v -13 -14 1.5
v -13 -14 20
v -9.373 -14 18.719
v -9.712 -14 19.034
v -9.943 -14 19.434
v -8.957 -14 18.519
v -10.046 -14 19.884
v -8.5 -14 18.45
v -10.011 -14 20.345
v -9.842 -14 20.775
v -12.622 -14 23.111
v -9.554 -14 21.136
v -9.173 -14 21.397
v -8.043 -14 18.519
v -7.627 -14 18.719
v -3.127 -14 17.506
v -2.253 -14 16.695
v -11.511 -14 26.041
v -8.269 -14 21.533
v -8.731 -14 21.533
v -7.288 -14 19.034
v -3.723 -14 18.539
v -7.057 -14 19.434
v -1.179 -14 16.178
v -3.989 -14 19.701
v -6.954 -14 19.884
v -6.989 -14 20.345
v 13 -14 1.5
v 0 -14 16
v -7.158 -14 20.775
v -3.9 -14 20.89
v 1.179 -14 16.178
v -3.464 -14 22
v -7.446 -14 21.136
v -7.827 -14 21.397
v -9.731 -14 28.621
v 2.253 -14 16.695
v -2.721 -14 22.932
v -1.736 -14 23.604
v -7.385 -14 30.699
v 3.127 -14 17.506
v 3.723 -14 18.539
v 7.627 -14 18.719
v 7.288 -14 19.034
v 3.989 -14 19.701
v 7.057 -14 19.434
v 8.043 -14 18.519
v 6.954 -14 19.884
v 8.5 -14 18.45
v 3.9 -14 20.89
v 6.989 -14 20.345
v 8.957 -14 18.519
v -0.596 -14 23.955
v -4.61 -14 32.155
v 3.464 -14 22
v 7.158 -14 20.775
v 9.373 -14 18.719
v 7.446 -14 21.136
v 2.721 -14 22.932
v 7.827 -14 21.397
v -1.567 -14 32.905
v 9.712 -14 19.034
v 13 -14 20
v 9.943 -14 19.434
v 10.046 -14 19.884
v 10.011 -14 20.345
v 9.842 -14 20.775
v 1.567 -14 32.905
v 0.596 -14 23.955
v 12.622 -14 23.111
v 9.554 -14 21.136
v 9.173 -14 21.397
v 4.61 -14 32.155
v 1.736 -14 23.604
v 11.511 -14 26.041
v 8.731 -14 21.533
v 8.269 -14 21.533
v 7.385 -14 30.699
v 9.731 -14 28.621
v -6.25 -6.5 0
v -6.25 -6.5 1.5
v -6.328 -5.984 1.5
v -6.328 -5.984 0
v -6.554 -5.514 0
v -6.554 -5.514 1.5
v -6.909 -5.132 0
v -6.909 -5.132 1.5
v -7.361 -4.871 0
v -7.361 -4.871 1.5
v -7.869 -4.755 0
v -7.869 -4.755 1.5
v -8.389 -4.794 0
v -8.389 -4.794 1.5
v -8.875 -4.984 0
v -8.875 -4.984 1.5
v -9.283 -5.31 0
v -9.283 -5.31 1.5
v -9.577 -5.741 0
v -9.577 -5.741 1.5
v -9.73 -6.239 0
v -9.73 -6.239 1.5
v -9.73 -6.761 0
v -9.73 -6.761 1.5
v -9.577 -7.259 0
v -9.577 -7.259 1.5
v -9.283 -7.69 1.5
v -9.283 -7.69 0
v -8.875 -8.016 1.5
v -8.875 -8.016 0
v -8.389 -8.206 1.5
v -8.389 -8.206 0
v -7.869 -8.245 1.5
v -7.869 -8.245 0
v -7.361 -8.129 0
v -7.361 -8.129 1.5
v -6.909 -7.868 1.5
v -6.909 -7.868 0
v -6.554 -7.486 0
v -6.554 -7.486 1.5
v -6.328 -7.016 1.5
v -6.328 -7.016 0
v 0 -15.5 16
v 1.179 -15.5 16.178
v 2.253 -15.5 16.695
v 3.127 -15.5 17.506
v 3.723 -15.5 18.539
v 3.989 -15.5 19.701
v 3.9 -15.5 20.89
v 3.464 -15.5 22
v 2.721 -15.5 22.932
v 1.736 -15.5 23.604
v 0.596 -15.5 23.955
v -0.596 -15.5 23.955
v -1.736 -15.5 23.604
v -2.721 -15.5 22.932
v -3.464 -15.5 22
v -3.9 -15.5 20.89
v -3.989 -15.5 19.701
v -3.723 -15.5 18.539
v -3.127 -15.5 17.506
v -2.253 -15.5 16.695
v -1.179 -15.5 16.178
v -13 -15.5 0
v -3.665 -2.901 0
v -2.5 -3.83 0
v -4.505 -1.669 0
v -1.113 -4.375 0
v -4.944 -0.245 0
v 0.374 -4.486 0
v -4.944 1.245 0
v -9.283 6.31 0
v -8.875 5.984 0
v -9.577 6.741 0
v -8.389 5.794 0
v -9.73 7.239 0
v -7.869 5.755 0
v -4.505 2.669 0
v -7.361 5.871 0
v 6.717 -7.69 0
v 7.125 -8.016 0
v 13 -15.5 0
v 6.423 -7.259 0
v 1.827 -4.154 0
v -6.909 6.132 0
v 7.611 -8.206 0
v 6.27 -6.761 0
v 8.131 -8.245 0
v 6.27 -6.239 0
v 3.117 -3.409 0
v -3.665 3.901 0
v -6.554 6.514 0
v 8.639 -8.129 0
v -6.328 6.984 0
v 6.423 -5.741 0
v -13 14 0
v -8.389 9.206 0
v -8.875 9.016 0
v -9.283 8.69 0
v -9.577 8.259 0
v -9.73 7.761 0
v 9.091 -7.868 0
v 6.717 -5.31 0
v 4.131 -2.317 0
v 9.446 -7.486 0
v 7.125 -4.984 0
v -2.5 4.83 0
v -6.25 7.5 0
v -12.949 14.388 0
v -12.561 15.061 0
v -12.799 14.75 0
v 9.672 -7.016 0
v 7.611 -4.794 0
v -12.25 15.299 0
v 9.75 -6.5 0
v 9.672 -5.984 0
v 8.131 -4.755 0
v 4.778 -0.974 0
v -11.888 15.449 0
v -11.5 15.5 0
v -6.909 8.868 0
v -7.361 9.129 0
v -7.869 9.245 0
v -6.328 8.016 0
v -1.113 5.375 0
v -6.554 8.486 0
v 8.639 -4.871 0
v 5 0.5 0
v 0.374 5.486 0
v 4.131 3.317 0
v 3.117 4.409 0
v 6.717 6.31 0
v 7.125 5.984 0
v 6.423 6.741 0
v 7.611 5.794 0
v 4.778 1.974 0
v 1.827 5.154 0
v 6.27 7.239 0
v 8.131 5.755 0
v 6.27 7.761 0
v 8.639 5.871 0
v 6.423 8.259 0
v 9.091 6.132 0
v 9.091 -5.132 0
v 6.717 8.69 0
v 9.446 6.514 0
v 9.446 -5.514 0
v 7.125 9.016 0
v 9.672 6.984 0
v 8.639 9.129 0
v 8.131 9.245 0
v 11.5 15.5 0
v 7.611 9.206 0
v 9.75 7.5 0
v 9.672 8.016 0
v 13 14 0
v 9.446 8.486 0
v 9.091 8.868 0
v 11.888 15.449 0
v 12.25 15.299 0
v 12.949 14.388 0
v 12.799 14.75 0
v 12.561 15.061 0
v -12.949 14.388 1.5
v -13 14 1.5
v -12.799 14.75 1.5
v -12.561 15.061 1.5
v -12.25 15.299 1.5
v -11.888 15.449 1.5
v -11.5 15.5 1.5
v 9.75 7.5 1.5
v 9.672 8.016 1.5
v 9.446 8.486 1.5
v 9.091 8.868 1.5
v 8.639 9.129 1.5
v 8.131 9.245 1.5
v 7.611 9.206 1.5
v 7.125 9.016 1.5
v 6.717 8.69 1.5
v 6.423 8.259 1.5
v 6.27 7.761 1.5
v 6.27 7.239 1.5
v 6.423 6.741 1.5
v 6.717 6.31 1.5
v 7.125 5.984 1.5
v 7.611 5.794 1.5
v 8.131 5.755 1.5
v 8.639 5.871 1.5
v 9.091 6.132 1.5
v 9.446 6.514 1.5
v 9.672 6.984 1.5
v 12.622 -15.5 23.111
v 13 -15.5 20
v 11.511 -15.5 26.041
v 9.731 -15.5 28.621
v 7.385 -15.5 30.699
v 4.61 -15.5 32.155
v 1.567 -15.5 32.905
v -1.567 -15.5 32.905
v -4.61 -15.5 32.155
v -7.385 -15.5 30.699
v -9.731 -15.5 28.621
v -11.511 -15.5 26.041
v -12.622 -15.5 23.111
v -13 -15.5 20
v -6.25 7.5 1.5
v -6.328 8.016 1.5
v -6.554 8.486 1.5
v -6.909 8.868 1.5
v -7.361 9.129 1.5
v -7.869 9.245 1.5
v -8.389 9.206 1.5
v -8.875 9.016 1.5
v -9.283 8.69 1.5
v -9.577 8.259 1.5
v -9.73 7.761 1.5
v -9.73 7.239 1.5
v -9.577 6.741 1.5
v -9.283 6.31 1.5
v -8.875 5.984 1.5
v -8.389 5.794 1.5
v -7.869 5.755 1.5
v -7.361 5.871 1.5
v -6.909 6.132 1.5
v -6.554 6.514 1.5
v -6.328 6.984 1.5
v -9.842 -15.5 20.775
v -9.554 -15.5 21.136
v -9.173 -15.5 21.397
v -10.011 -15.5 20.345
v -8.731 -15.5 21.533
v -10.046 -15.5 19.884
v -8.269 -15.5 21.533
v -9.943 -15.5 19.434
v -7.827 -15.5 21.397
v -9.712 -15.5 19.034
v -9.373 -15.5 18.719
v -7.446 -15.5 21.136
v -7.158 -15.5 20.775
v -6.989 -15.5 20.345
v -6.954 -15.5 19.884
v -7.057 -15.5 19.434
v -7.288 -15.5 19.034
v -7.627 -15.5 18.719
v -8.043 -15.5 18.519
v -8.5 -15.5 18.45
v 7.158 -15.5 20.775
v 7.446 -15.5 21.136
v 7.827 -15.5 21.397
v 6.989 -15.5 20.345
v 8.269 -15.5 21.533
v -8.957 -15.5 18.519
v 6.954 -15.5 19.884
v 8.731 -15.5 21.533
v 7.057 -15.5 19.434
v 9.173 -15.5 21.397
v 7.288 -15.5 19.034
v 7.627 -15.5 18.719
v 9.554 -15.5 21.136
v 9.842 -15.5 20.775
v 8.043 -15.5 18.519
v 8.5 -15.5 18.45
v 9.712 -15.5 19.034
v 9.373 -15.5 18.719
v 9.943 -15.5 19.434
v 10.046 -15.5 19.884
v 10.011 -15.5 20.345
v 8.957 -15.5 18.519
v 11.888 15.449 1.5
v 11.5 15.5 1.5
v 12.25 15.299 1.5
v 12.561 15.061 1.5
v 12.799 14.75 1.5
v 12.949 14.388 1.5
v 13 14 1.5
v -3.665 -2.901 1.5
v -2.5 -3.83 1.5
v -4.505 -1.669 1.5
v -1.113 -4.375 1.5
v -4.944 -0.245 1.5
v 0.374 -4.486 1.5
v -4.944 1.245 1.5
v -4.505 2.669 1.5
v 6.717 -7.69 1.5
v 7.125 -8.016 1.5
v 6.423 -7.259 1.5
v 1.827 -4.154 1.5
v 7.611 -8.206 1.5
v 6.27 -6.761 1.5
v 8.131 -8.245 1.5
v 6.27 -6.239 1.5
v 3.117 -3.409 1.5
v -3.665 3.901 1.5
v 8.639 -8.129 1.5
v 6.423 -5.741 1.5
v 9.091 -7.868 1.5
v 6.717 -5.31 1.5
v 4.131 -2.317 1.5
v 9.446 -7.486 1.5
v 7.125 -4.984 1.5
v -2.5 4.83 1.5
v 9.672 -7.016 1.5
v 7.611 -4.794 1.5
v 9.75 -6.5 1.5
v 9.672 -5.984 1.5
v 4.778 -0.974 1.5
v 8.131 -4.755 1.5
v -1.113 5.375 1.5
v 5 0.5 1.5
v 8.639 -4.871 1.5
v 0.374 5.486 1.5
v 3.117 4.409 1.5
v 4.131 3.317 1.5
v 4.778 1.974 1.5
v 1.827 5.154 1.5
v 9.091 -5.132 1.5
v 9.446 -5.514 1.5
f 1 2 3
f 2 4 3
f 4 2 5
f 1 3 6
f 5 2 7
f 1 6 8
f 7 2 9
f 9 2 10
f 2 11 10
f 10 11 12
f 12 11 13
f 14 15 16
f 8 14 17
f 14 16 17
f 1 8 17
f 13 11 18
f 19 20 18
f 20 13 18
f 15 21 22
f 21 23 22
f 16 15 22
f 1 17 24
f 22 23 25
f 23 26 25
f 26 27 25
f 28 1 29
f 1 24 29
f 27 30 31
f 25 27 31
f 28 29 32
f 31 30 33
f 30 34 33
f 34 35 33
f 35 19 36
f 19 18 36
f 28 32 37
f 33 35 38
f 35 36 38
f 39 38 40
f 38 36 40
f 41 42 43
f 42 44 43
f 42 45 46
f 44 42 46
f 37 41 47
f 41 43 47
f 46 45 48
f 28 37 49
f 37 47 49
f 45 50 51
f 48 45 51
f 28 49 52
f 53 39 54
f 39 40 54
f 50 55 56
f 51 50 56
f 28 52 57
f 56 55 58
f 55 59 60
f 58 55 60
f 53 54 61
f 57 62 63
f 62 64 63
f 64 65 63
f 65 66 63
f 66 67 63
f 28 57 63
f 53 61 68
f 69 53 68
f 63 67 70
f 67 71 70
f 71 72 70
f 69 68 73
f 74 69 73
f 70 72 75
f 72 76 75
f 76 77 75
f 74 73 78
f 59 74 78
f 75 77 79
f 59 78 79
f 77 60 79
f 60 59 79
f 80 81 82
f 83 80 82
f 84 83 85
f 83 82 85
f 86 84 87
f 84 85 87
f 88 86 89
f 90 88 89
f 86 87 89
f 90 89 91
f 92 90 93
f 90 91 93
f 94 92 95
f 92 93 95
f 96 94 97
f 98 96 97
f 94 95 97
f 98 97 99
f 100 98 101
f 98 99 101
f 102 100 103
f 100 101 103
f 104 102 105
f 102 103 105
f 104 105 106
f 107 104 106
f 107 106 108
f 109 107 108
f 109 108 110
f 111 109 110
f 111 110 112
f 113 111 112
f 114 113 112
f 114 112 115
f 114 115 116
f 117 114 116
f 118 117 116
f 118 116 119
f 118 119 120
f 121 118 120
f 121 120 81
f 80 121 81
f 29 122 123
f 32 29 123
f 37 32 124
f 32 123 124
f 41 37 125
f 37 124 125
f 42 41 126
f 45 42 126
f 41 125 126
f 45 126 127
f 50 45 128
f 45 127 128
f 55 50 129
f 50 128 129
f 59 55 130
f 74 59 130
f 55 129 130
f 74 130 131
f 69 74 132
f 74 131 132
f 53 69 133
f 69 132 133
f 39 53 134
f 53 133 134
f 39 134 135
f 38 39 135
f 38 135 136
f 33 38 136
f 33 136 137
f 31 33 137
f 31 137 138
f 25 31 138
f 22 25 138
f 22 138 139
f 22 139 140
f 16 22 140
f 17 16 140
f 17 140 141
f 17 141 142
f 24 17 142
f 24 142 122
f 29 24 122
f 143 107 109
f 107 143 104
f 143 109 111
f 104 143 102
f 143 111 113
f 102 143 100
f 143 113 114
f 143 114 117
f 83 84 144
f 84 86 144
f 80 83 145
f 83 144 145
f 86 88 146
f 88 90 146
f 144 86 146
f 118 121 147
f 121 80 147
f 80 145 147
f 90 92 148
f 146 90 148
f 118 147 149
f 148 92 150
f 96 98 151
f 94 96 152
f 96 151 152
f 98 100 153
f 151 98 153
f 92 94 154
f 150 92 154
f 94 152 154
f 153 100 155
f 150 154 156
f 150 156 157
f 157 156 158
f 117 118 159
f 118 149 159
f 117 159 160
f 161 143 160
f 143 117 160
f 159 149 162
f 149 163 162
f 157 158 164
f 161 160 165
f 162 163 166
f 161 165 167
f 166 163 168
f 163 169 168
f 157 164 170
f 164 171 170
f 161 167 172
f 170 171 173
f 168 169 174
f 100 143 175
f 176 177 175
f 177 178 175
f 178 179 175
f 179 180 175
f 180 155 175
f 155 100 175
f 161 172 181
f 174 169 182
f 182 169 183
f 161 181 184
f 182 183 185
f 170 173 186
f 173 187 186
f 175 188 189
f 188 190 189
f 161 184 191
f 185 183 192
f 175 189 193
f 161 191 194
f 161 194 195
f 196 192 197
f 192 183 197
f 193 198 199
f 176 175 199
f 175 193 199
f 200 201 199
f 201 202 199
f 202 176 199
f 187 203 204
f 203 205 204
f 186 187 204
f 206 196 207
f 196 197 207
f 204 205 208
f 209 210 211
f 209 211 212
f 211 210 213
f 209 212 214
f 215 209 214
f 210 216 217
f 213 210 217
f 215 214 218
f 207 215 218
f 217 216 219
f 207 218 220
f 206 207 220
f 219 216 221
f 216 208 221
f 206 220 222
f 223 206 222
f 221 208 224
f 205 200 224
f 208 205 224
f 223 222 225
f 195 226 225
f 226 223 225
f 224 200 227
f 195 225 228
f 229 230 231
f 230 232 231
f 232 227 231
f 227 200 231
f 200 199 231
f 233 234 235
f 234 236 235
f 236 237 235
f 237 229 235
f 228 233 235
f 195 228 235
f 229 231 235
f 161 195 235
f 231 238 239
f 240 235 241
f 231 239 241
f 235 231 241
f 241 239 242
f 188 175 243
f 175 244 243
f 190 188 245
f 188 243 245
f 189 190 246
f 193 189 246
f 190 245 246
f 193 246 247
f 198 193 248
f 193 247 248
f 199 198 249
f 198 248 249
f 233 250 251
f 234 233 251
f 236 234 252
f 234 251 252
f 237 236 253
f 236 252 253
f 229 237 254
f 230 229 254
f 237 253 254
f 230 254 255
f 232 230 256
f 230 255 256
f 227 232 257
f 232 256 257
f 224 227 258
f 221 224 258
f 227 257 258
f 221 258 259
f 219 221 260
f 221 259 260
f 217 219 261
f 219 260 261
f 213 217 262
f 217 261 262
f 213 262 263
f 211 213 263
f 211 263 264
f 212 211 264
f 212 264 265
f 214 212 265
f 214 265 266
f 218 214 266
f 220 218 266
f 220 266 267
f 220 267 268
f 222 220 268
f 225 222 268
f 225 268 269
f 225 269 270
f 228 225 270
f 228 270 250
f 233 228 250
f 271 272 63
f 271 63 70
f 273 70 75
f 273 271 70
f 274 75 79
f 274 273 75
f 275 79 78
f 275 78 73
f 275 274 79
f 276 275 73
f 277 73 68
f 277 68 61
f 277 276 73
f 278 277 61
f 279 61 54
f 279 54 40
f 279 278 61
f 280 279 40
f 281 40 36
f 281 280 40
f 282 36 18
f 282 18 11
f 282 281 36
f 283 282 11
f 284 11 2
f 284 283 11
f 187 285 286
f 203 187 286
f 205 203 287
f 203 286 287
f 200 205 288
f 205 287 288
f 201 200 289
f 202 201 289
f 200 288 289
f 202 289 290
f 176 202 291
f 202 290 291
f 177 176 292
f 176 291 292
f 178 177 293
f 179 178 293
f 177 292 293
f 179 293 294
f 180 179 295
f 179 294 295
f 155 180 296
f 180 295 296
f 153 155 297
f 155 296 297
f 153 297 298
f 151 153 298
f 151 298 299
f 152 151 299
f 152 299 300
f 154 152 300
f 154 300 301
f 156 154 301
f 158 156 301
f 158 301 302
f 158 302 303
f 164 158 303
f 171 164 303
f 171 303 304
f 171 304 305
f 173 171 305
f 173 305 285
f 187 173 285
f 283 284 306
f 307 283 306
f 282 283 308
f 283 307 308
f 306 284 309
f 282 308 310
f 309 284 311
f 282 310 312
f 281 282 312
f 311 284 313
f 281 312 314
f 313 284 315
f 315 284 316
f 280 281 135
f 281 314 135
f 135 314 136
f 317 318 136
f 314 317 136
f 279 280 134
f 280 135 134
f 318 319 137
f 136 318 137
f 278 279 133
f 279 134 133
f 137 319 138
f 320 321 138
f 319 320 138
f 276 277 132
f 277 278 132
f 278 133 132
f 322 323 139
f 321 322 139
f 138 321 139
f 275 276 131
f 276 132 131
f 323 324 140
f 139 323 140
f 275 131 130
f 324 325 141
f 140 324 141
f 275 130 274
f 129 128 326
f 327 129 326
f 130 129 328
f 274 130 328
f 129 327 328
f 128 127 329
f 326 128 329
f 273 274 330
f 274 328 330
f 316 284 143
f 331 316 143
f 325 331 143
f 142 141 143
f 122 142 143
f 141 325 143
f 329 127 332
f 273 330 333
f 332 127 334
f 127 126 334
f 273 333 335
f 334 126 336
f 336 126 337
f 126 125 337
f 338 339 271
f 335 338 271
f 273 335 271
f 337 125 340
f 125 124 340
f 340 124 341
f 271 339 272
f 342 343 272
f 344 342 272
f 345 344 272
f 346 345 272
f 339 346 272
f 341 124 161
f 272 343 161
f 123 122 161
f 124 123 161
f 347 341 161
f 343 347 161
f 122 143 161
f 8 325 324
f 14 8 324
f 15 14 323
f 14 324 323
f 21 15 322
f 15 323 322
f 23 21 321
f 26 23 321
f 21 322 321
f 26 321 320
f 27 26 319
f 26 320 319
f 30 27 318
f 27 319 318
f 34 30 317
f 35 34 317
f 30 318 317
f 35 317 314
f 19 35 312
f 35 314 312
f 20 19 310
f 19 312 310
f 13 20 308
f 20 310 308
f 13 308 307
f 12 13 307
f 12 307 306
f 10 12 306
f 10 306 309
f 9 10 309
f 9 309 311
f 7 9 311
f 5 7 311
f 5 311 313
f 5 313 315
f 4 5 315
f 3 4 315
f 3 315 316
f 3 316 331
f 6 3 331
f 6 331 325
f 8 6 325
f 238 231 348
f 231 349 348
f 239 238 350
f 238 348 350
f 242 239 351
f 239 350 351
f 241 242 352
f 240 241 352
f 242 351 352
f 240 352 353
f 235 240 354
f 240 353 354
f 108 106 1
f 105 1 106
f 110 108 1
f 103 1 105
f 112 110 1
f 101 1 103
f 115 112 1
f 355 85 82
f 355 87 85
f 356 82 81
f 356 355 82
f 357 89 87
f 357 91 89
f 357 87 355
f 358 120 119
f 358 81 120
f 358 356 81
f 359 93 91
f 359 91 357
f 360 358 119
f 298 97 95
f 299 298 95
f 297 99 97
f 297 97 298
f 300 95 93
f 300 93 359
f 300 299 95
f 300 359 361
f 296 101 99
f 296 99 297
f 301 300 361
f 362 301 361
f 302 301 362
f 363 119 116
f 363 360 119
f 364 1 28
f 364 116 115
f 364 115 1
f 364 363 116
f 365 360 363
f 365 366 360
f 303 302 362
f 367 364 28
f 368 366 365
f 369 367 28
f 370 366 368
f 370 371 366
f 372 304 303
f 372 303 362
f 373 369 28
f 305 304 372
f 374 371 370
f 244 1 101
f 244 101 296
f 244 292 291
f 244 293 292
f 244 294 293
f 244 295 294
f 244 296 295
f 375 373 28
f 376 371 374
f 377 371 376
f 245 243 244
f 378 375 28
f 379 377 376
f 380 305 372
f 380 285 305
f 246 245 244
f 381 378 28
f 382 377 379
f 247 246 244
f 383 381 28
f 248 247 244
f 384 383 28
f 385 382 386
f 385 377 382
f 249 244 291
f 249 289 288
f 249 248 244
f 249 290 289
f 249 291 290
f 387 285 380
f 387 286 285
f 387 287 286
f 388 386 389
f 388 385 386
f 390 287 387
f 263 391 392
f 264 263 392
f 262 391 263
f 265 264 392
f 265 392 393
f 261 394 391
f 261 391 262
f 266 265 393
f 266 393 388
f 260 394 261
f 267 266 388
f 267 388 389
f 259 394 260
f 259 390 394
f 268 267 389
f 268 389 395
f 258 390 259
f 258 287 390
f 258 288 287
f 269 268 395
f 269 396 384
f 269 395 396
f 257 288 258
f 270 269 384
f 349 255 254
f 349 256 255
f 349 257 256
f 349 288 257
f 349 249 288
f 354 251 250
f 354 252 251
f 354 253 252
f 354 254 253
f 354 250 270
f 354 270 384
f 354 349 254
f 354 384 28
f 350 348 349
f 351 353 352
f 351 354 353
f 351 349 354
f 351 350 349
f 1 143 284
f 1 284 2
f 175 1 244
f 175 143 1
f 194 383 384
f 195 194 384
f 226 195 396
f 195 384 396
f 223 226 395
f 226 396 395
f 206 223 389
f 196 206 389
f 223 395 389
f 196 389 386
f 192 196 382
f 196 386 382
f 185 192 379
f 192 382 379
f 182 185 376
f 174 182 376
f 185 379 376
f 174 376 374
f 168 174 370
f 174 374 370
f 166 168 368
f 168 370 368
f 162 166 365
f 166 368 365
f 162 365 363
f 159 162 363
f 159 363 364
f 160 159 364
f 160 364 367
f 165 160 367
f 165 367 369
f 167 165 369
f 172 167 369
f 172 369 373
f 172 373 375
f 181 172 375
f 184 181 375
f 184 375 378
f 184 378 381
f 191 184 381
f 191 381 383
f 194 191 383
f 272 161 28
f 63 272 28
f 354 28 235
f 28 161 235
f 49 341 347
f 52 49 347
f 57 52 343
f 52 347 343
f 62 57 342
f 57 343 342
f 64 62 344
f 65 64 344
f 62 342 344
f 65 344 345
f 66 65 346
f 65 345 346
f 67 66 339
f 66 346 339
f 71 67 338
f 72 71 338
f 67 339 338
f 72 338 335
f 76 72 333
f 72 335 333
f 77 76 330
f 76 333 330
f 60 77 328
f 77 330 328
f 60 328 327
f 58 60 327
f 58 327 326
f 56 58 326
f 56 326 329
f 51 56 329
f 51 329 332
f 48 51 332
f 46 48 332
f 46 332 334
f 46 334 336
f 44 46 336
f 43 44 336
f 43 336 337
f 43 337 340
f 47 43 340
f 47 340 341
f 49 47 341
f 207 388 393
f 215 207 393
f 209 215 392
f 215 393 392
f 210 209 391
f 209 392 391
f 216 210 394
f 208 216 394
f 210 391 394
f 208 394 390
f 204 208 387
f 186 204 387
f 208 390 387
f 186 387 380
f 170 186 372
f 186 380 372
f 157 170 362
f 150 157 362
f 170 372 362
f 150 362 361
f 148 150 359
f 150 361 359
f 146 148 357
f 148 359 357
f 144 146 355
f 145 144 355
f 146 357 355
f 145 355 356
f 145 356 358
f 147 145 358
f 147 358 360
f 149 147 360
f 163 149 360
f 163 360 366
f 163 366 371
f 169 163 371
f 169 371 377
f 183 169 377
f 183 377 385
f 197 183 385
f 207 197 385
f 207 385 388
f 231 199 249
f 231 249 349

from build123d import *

# Parameters (mm, degrees)
SKETCH_1_W          = 26
SKETCH_1_H          = 31
EXTRUDE_1_DEPTH     = 1.5
EXTRUDE_2_DEPTH     = 1.5
SKETCH_3_R          = 4
SKETCH_3_R_2        = 1.55
CUT_EXTRUDE_1_DEPTH = 1000
FILLET_1_R          = 1.5
SKETCH_4_R          = 5
SKETCH_4_R_2        = 1.75
CUT_EXTRUDE_2_DEPTH = 100


with BuildPart() as part:
    # 草图1 → 凸台-拉伸1 (new body)
    with BuildSketch(Plane.XY):
        Rectangle(SKETCH_1_W, SKETCH_1_H)
    extrude(amount=EXTRUDE_1_DEPTH)

    # 草图2 → 凸台-拉伸2 (add)
    with BuildSketch(Plane.XZ.offset(15.5)):
        with BuildLine():
            Line((-13, 0), (13, 0))
            Line((13, 0), (13, 20))
            ThreePointArc((13, 20), (0, 33), (-13, 20))
            Line((-13, 20), (-13, 0))
        make_face()
    extrude(amount=-EXTRUDE_2_DEPTH)

    # 草图3 → 切除-拉伸1 (cut)
    with BuildSketch(Plane.XZ.offset(15.5)):
        with Locations(Location((0, 20, 0), (0, 0, 270))):
            Circle(SKETCH_3_R)
        with Locations(Location((8.5, 20, 0), (0, 0, 270))):
            Circle(SKETCH_3_R_2)
        with Locations(Location((-8.5, 20, 0), (0, 0, 270))):
            Circle(SKETCH_3_R_2)
    extrude(amount=-CUT_EXTRUDE_1_DEPTH, mode=Mode.SUBTRACT)

    # 圆角1
    fillet_1_edges = [part.edges().sort_by_distance(p)[0] for p in [
        (-13, 15.5, 0.75),
        (13, 15.5, 0.75),
    ]]
    fillet(fillet_1_edges, radius=FILLET_1_R)

    # 草图4 → 切除-拉伸2 (cut)
    with BuildSketch(Plane.XY.offset(1.5)):
        with Locations((0, 0.5)):
            Circle(SKETCH_4_R)
        with Locations((-8, 7.5)):
            Circle(SKETCH_4_R_2)
        with Locations((8, 7.5)):
            Circle(SKETCH_4_R_2)
        with Locations((-8, -6.5)):
            Circle(SKETCH_4_R_2)
        with Locations((8, -6.5)):
            Circle(SKETCH_4_R_2)
    extrude(amount=-CUT_EXTRUDE_2_DEPTH, mode=Mode.SUBTRACT)


solid = part.part
